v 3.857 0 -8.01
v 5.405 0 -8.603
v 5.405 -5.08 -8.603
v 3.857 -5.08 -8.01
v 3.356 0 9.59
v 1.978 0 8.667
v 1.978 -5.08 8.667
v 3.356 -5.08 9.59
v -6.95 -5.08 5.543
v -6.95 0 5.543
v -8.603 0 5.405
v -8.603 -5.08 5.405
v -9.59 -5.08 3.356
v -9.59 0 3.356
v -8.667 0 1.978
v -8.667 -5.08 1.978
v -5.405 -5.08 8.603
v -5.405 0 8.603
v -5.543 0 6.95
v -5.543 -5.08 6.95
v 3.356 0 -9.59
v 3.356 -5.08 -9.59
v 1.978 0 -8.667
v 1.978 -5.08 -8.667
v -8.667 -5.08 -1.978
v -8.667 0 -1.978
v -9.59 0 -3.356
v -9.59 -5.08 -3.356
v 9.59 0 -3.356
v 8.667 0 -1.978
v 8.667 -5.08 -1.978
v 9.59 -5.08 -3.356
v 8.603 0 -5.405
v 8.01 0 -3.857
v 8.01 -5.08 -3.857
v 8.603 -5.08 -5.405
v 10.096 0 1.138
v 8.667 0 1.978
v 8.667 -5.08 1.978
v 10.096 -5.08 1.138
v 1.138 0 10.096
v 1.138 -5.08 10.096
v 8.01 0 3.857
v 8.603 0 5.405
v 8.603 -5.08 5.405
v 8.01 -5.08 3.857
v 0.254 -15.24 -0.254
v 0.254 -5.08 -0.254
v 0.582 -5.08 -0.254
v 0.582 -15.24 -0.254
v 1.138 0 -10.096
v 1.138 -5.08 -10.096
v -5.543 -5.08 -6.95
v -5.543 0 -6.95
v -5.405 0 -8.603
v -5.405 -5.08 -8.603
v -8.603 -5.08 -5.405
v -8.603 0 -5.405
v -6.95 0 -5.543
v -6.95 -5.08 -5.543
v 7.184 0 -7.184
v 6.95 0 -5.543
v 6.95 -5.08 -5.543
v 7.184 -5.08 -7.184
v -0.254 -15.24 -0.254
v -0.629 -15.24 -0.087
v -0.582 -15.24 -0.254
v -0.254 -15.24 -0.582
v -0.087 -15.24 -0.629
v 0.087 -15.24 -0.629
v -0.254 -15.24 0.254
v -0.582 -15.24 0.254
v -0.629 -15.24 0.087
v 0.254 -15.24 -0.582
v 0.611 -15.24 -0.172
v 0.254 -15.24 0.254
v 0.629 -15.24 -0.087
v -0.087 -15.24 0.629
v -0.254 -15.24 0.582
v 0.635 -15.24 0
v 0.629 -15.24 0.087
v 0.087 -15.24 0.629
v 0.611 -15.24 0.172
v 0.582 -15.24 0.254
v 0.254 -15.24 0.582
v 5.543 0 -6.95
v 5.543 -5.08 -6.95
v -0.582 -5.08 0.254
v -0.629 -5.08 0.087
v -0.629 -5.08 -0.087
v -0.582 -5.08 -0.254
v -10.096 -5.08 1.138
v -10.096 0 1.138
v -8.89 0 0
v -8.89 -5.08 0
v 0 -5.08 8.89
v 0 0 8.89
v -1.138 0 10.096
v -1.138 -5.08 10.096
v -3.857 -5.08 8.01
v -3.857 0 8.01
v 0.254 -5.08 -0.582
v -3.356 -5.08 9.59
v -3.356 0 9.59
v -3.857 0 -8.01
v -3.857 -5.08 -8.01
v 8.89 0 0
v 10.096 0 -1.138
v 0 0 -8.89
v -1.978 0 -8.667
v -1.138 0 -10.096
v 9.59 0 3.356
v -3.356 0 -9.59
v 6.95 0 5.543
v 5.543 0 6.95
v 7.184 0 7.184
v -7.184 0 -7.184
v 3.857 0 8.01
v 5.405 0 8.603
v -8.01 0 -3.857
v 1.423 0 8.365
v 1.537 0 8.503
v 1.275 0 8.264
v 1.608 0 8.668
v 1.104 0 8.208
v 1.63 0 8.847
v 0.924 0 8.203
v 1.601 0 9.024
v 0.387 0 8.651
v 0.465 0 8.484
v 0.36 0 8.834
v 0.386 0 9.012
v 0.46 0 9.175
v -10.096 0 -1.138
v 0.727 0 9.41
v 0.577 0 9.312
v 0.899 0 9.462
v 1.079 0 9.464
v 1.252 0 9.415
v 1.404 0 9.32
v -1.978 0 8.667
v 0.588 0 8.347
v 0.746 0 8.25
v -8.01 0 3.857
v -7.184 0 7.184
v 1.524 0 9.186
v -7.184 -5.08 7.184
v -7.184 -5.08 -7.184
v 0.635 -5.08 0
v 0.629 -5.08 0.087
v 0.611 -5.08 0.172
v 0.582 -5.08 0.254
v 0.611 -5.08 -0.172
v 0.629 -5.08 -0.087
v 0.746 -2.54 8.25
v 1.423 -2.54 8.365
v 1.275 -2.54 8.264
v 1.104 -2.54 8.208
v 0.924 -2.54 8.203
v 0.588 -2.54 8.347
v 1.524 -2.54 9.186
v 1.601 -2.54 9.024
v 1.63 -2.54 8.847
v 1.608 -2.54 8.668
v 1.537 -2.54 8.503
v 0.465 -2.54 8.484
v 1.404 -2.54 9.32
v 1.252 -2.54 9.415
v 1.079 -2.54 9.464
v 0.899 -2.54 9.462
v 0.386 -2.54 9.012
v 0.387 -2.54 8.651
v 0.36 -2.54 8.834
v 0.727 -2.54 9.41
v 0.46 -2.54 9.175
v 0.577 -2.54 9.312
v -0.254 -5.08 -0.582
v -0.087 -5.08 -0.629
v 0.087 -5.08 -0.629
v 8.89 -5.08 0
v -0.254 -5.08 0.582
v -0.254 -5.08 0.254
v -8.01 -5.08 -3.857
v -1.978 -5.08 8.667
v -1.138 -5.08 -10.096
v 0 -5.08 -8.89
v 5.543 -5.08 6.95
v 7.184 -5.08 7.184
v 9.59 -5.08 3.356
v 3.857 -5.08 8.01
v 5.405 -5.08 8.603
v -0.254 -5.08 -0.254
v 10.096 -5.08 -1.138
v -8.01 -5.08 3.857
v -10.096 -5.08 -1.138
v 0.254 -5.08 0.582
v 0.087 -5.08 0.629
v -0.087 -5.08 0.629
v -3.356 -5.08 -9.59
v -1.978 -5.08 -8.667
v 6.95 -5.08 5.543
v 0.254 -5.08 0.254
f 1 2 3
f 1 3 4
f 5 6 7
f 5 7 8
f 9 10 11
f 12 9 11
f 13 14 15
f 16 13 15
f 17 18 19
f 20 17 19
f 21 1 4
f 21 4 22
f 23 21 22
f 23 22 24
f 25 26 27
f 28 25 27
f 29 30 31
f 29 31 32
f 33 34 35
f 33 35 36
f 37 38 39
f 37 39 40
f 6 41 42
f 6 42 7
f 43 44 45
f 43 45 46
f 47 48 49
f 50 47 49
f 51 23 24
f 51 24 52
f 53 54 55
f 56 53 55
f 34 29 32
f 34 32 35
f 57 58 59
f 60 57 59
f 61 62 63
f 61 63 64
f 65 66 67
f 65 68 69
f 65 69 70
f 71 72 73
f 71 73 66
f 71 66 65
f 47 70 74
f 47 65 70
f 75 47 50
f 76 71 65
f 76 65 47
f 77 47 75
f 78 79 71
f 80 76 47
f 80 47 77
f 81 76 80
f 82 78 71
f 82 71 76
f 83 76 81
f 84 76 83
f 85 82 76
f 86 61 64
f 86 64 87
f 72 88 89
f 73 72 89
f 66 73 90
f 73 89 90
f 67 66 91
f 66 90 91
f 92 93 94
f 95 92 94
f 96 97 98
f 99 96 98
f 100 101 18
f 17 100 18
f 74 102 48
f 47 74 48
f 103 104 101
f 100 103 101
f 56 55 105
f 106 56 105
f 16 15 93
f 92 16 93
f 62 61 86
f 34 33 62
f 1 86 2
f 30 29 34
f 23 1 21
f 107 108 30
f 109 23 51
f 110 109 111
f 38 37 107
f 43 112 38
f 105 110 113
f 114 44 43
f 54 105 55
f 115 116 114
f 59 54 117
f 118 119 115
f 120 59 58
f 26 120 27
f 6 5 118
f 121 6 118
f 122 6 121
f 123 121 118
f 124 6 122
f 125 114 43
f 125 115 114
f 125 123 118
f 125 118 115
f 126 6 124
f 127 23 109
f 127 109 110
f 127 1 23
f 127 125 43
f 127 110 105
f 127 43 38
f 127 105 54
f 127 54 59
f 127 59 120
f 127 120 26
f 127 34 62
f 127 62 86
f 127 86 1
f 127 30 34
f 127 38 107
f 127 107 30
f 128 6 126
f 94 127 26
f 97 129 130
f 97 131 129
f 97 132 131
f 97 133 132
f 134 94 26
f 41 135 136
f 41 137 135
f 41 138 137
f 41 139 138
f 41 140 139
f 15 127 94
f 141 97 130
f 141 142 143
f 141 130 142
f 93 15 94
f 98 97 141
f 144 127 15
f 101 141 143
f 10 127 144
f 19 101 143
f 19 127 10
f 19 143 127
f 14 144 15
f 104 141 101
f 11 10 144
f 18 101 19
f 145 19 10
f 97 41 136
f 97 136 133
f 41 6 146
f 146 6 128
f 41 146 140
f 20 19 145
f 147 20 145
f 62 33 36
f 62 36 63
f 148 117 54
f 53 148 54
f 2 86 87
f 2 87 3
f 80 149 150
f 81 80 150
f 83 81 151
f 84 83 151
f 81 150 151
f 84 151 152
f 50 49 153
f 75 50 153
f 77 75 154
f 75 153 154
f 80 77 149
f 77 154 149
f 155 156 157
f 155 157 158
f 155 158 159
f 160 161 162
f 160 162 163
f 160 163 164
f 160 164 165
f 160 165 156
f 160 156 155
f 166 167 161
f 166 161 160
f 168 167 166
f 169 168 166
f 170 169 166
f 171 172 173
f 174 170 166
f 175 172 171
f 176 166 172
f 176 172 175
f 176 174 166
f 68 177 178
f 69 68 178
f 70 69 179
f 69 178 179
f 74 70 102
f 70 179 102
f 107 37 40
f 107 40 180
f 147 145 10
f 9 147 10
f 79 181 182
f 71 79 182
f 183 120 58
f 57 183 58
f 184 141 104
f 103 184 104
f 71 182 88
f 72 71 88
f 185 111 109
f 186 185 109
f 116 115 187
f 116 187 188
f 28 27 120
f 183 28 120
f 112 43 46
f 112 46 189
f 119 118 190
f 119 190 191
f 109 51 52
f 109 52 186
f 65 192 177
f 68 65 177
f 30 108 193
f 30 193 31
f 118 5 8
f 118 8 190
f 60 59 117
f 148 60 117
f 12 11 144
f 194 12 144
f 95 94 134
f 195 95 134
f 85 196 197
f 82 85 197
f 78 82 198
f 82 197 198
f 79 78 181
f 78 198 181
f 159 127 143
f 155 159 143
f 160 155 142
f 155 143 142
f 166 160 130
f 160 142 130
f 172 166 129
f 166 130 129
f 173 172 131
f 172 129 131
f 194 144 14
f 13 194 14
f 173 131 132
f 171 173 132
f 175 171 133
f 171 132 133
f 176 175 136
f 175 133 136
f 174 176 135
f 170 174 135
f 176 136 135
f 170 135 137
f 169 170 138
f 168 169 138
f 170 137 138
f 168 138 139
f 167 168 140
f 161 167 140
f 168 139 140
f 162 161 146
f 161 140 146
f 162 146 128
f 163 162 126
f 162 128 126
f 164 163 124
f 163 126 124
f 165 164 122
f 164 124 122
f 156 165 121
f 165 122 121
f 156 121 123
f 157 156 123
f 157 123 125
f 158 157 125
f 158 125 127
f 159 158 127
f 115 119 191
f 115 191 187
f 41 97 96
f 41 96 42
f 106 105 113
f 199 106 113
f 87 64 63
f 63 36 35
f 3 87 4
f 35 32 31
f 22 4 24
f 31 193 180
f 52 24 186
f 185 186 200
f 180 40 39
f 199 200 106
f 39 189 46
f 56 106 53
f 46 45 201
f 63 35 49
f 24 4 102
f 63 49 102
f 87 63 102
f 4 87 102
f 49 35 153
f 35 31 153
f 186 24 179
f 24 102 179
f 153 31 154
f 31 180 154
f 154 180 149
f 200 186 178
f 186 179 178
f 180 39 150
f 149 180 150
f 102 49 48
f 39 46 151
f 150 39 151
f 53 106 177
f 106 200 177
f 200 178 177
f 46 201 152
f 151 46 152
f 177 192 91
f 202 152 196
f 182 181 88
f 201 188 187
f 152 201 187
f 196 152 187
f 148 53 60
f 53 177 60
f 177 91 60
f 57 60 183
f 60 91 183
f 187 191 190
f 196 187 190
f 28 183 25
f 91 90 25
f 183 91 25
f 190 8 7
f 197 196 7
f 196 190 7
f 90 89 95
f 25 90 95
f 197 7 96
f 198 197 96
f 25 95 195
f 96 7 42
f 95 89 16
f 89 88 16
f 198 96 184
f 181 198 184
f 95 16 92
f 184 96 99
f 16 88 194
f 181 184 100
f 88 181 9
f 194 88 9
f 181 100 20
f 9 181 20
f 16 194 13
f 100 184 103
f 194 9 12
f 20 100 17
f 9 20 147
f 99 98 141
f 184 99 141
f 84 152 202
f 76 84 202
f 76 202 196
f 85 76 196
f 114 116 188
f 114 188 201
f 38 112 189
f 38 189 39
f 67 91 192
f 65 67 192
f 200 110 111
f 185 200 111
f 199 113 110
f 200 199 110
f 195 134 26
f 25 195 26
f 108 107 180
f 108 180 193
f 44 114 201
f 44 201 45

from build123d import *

# Parameters (mm, degrees)
F1_DEPTH = 5.08
F3_W     = 0.508
F3_H     = 0.508
F4_DEPTH = 10.16
F6_DEPTH = 2.54


with BuildPart() as f1:
    # F0 (on Front) → F1 (new body)
    with BuildSketch(Plane.XZ):
        with BuildLine():
            Line((-4.7297651602, 7.5273781311), (0, 0))
            Line((0, 0), (-3.8572264408, 8.0096132357))
            ThreePointArc((-3.8572264408, 8.0096132357), (-4.3002609064, 7.7807362208), (-4.7297651602, 7.5273781311))
        make_face()
        with BuildLine():
            Line((-5.5428243385, 6.9504818791), (0, 0))
            Line((0, 0), (-4.7297651602, 7.5273781311))
            ThreePointArc((-4.7297651602, 7.5273781311), (-5.144387823, 7.250336125), (-5.5428243385, 6.9504818791))
        make_face()
        with BuildLine():
            Line((-5.4054458974, 8.6027178642), (-5.5428243385, 6.9504818791))
            ThreePointArc((-5.5428243385, 6.9504818791), (-5.144387823, 7.250336125), (-4.7297651602, 7.5273781311))
            Line((-4.7297651602, 7.5273781311), (-5.4054458974, 8.6027178642))
        make_face()
        with BuildLine():
            Line((-5.4054458974, 8.6027178642), (-4.7297651602, 7.5273781311))
            ThreePointArc((-4.7297651602, 7.5273781311), (-4.3002609064, 7.7807362208), (-3.8572264408, 8.0096132357))
            Line((-3.8572264408, 8.0096132357), (-5.4054458974, 8.6027178642))
        make_face()
        with BuildLine():
            Line((-3.3556352695, 9.5898546359), (-3.8572264408, 8.0096132357))
            ThreePointArc((-3.8572264408, 8.0096132357), (-3.4020557137, 8.213289044), (-2.9361808608, 8.3911228064))
            Line((-2.9361808608, 8.3911228064), (-3.3556352695, 9.5898546359))
        make_face()
        with BuildLine():
            Line((-3.3556352695, 9.5898546359), (-2.9361808608, 8.3911228064))
            ThreePointArc((-2.9361808608, 8.3911228064), (-2.4610676966, 8.5425549921), (-1.9782111029, 8.6671091393))
            Line((-1.9782111029, 8.6671091393), (-3.3556352695, 9.5898546359))
        make_face()
        with BuildLine():
            Line((-2.9361808608, 8.3911228064), (0, 0))
            Line((0, 0), (-1.9782111029, 8.6671091393))
            ThreePointArc((-1.9782111029, 8.6671091393), (-2.4610676966, 8.5425549921), (-2.9361808608, 8.3911228064))
        make_face()
        with BuildLine():
            Line((-3.8572264408, 8.0096132357), (0, 0))
            Line((0, 0), (-2.9361808608, 8.3911228064))
            ThreePointArc((-2.9361808608, 8.3911228064), (-3.4020557137, 8.213289044), (-3.8572264408, 8.0096132357))
        make_face()
        with BuildLine():
            Line((-0.9953641926, 8.834101546), (0, 0))
            Line((0, 0), (0, 8.89))
            ThreePointArc((0, 8.89), (-0.4984662759, 8.8760143855), (-0.9953641926, 8.834101546))
        make_face()
        with BuildLine():
            ThreePointArc((-0.9953641926, 8.834101546), (-0.4984662759, 8.8760143855), (0, 8.89))
            Line((0, 8.89), (-1.1375590772, 10.0961160525))
            Line((-1.1375590772, 10.0961160525), (-0.9953641926, 8.834101546))
        make_face()
        with BuildLine():
            Line((-1.1375590772, 10.0961160525), (-1.9782111029, 8.6671091393))
            ThreePointArc((-1.9782111029, 8.6671091393), (-1.4891303252, 8.7643933546), (-0.9953641926, 8.834101546))
            Line((-0.9953641926, 8.834101546), (-1.1375590772, 10.0961160525))
        make_face()
        with BuildLine():
            Line((-1.9782111029, 8.6671091393), (0, 0))
            Line((0, 0), (-0.9953641926, 8.834101546))
            ThreePointArc((-0.9953641926, 8.834101546), (-1.4891303252, 8.7643933546), (-1.9782111029, 8.6671091393))
        make_face()
        with BuildLine():
            Line((-6.2861792847, 6.2861792847), (0, 0))
            Line((0, 0), (-5.5428243385, 6.9504818791))
            ThreePointArc((-5.5428243385, 6.9504818791), (-5.923821078, 6.6287588458), (-6.2861792847, 6.2861792847))
        make_face()
        with BuildLine():
            Line((-7.1842048969, 7.1842048969), (-6.2861792847, 6.2861792847))
            ThreePointArc((-6.2861792847, 6.2861792847), (-5.923821078, 6.6287588458), (-5.5428243385, 6.9504818791))
            Line((-5.5428243385, 6.9504818791), (-7.1842048969, 7.1842048969))
        make_face()
        with BuildLine():
            Line((-6.9504818791, 5.5428243385), (0, 0))
            Line((0, 0), (-6.2861792847, 6.2861792847))
            ThreePointArc((-6.2861792847, 6.2861792847), (-6.6287588458, 5.923821078), (-6.9504818791, 5.5428243385))
        make_face()
        with BuildLine():
            Line((-7.1842048969, 7.1842048969), (-6.9504818791, 5.5428243385))
            ThreePointArc((-6.9504818791, 5.5428243385), (-6.6287588458, 5.923821078), (-6.2861792847, 6.2861792847))
            Line((-6.2861792847, 6.2861792847), (-7.1842048969, 7.1842048969))
        make_face()
        with BuildLine():
            Line((-7.5273781311, 4.7297651602), (0, 0))
            Line((0, 0), (-6.9504818791, 5.5428243385))
            ThreePointArc((-6.9504818791, 5.5428243385), (-7.250336125, 5.144387823), (-7.5273781311, 4.7297651602))
        make_face()
        with BuildLine():
            Line((-8.6027178642, 5.4054458974), (-7.5273781311, 4.7297651602))
            ThreePointArc((-7.5273781311, 4.7297651602), (-7.250336125, 5.144387823), (-6.9504818791, 5.5428243385))
            Line((-6.9504818791, 5.5428243385), (-8.6027178642, 5.4054458974))
        make_face()
        with BuildLine():
            Line((-8.6027178642, 5.4054458974), (-8.0096132357, 3.8572264408))
            ThreePointArc((-8.0096132357, 3.8572264408), (-7.7807362208, 4.3002609064), (-7.5273781311, 4.7297651602))
            Line((-7.5273781311, 4.7297651602), (-8.6027178642, 5.4054458974))
        make_face()
        with BuildLine():
            Line((-8.0096132357, 3.8572264408), (0, 0))
            Line((0, 0), (-7.5273781311, 4.7297651602))
            ThreePointArc((-7.5273781311, 4.7297651602), (-7.7807362208, 4.3002609064), (-8.0096132357, 3.8572264408))
        make_face()
        with BuildLine():
            Line((-8.3911228064, 2.9361808608), (0, 0))
            Line((0, 0), (-8.0096132357, 3.8572264408))
            ThreePointArc((-8.0096132357, 3.8572264408), (-8.213289044, 3.4020557137), (-8.3911228064, 2.9361808608))
        make_face()
        with BuildLine():
            Line((-9.5898546359, 3.3556352695), (-8.3911228064, 2.9361808608))
            ThreePointArc((-8.3911228064, 2.9361808608), (-8.213289044, 3.4020557137), (-8.0096132357, 3.8572264408))
            Line((-8.0096132357, 3.8572264408), (-9.5898546359, 3.3556352695))
        make_face()
        with BuildLine():
            Line((-9.5898546359, 3.3556352695), (-8.6671091393, 1.9782111029))
            ThreePointArc((-8.6671091393, 1.9782111029), (-8.5425549921, 2.4610676966), (-8.3911228064, 2.9361808608))
            Line((-8.3911228064, 2.9361808608), (-9.5898546359, 3.3556352695))
        make_face()
        with BuildLine():
            Line((-8.6671091393, 1.9782111029), (0, 0))
            Line((0, 0), (-8.3911228064, 2.9361808608))
            ThreePointArc((-8.3911228064, 2.9361808608), (-8.5425549921, 2.4610676966), (-8.6671091393, 1.9782111029))
        make_face()
        with BuildLine():
            Line((-8.834101546, 0.9953641926), (0, 0))
            Line((0, 0), (-8.6671091393, 1.9782111029))
            ThreePointArc((-8.6671091393, 1.9782111029), (-8.7643933546, 1.4891303252), (-8.834101546, 0.9953641926))
        make_face()
        with BuildLine():
            Line((-10.0961160525, 1.1375590772), (-8.834101546, 0.9953641926))
            ThreePointArc((-8.834101546, 0.9953641926), (-8.7643933546, 1.4891303252), (-8.6671091393, 1.9782111029))
            Line((-8.6671091393, 1.9782111029), (-10.0961160525, 1.1375590772))
        make_face()
        with BuildLine():
            Line((-10.0961160525, 1.1375590772), (-8.89, 0))
            ThreePointArc((-8.89, 0), (-8.8760143855, 0.4984662759), (-8.834101546, 0.9953641926))
            Line((-8.834101546, 0.9953641926), (-10.0961160525, 1.1375590772))
        make_face()
        with BuildLine():
            Line((-8.89, 0), (0, 0))
            Line((0, 0), (-8.834101546, 0.9953641926))
            ThreePointArc((-8.834101546, 0.9953641926), (-8.8760143855, 0.4984662759), (-8.89, 0))
        make_face()
        with BuildLine():
            Line((-8.834101546, -0.9953641926), (0, 0))
            Line((0, 0), (-8.89, 0))
            ThreePointArc((-8.89, 0), (-8.8760143855, -0.4984662759), (-8.834101546, -0.9953641926))
        make_face()
        with BuildLine():
            Line((-10.0961160525, -1.1375590772), (-8.834101546, -0.9953641926))
            ThreePointArc((-8.834101546, -0.9953641926), (-8.8760143855, -0.4984662759), (-8.89, 0))
            Line((-8.89, 0), (-10.0961160525, -1.1375590772))
        make_face()
        with BuildLine():
            Line((-10.0961160525, -1.1375590772), (-8.6671091393, -1.9782111029))
            ThreePointArc((-8.6671091393, -1.9782111029), (-8.7643933546, -1.4891303252), (-8.834101546, -0.9953641926))
            Line((-8.834101546, -0.9953641926), (-10.0961160525, -1.1375590772))
        make_face()
        with BuildLine():
            Line((-8.6671091393, -1.9782111029), (0, 0))
            Line((0, 0), (-8.834101546, -0.9953641926))
            ThreePointArc((-8.834101546, -0.9953641926), (-8.7643933546, -1.4891303252), (-8.6671091393, -1.9782111029))
        make_face()
        with BuildLine():
            Line((-8.3911228064, -2.9361808608), (0, 0))
            Line((0, 0), (-8.6671091393, -1.9782111029))
            ThreePointArc((-8.6671091393, -1.9782111029), (-8.5425549921, -2.4610676966), (-8.3911228064, -2.9361808608))
        make_face()
        with BuildLine():
            Line((-9.5898546359, -3.3556352695), (-8.3911228064, -2.9361808608))
            ThreePointArc((-8.3911228064, -2.9361808608), (-8.5425549921, -2.4610676966), (-8.6671091393, -1.9782111029))
            Line((-8.6671091393, -1.9782111029), (-9.5898546359, -3.3556352695))
        make_face()
        with BuildLine():
            Line((-9.5898546359, -3.3556352695), (-8.0096132357, -3.8572264408))
            ThreePointArc((-8.0096132357, -3.8572264408), (-8.213289044, -3.4020557137), (-8.3911228064, -2.9361808608))
            Line((-8.3911228064, -2.9361808608), (-9.5898546359, -3.3556352695))
        make_face()
        with BuildLine():
            Line((-8.0096132357, -3.8572264408), (0, 0))
            Line((0, 0), (-8.3911228064, -2.9361808608))
            ThreePointArc((-8.3911228064, -2.9361808608), (-8.213289044, -3.4020557137), (-8.0096132357, -3.8572264408))
        make_face()
        with BuildLine():
            Line((-7.5273781311, -4.7297651602), (0, 0))
            Line((0, 0), (-8.0096132357, -3.8572264408))
            ThreePointArc((-8.0096132357, -3.8572264408), (-7.7807362208, -4.3002609064), (-7.5273781311, -4.7297651602))
        make_face()
        with BuildLine():
            Line((-8.6027178642, -5.4054458974), (-7.5273781311, -4.7297651602))
            ThreePointArc((-7.5273781311, -4.7297651602), (-7.7807362208, -4.3002609064), (-8.0096132357, -3.8572264408))
            Line((-8.0096132357, -3.8572264408), (-8.6027178642, -5.4054458974))
        make_face()
        with BuildLine():
            Line((-8.6027178642, -5.4054458974), (-6.9504818791, -5.5428243385))
            ThreePointArc((-6.9504818791, -5.5428243385), (-7.250336125, -5.144387823), (-7.5273781311, -4.7297651602))
            Line((-7.5273781311, -4.7297651602), (-8.6027178642, -5.4054458974))
        make_face()
        with BuildLine():
            Line((-6.9504818791, -5.5428243385), (0, 0))
            Line((0, 0), (-7.5273781311, -4.7297651602))
            ThreePointArc((-7.5273781311, -4.7297651602), (-7.250336125, -5.144387823), (-6.9504818791, -5.5428243385))
        make_face()
        with BuildLine():
            Line((-6.2861792847, -6.2861792847), (0, 0))
            Line((0, 0), (-6.9504818791, -5.5428243385))
            ThreePointArc((-6.9504818791, -5.5428243385), (-6.6287588458, -5.923821078), (-6.2861792847, -6.2861792847))
        make_face()
        with BuildLine():
            Line((-5.5428243385, -6.9504818791), (0, 0))
            Line((0, 0), (-6.2861792847, -6.2861792847))
            ThreePointArc((-6.2861792847, -6.2861792847), (-5.923821078, -6.6287588458), (-5.5428243385, -6.9504818791))
        make_face()
        with BuildLine():
            Line((-4.7297651602, -7.5273781311), (0, 0))
            Line((0, 0), (-5.5428243385, -6.9504818791))
            ThreePointArc((-5.5428243385, -6.9504818791), (-5.144387823, -7.250336125), (-4.7297651602, -7.5273781311))
        make_face()
        with BuildLine():
            Line((-7.1842048969, -7.1842048969), (-6.2861792847, -6.2861792847))
            ThreePointArc((-6.2861792847, -6.2861792847), (-6.6287588458, -5.923821078), (-6.9504818791, -5.5428243385))
            Line((-6.9504818791, -5.5428243385), (-7.1842048969, -7.1842048969))
        make_face()
        with BuildLine():
            Line((-7.1842048969, -7.1842048969), (-5.5428243385, -6.9504818791))
            ThreePointArc((-5.5428243385, -6.9504818791), (-5.923821078, -6.6287588458), (-6.2861792847, -6.2861792847))
            Line((-6.2861792847, -6.2861792847), (-7.1842048969, -7.1842048969))
        make_face()
        with BuildLine():
            Line((-5.4054458974, -8.6027178642), (-4.7297651602, -7.5273781311))
            ThreePointArc((-4.7297651602, -7.5273781311), (-5.144387823, -7.250336125), (-5.5428243385, -6.9504818791))
            Line((-5.5428243385, -6.9504818791), (-5.4054458974, -8.6027178642))
        make_face()
        with BuildLine():
            Line((-5.4054458974, -8.6027178642), (-3.8572264408, -8.0096132357))
            ThreePointArc((-3.8572264408, -8.0096132357), (-4.3002609064, -7.7807362208), (-4.7297651602, -7.5273781311))
            Line((-4.7297651602, -7.5273781311), (-5.4054458974, -8.6027178642))
        make_face()
        with BuildLine():
            Line((-2.9361808608, -8.3911228064), (0, 0))
            Line((0, 0), (-3.8572264408, -8.0096132357))
            ThreePointArc((-3.8572264408, -8.0096132357), (-3.4020557137, -8.213289044), (-2.9361808608, -8.3911228064))
        make_face()
        with BuildLine():
            Line((-3.3556352695, -9.5898546359), (-2.9361808608, -8.3911228064))
            ThreePointArc((-2.9361808608, -8.3911228064), (-3.4020557137, -8.213289044), (-3.8572264408, -8.0096132357))
            Line((-3.8572264408, -8.0096132357), (-3.3556352695, -9.5898546359))
        make_face()
        with BuildLine():
            Line((-3.3556352695, -9.5898546359), (-1.9782111029, -8.6671091393))
            ThreePointArc((-1.9782111029, -8.6671091393), (-2.4610676966, -8.5425549921), (-2.9361808608, -8.3911228064))
            Line((-2.9361808608, -8.3911228064), (-3.3556352695, -9.5898546359))
        make_face()
        with BuildLine():
            Line((-1.9782111029, -8.6671091393), (0, 0))
            Line((0, 0), (-2.9361808608, -8.3911228064))
            ThreePointArc((-2.9361808608, -8.3911228064), (-2.4610676966, -8.5425549921), (-1.9782111029, -8.6671091393))
        make_face()
        with BuildLine():
            Line((-0.9953641926, -8.834101546), (0, 0))
            Line((0, 0), (-1.9782111029, -8.6671091393))
            ThreePointArc((-1.9782111029, -8.6671091393), (-1.4891303252, -8.7643933546), (-0.9953641926, -8.834101546))
        make_face()
        with BuildLine():
            Line((-1.1375590772, -10.0961160525), (0, -8.89))
            ThreePointArc((0, -8.89), (-0.4984662759, -8.8760143855), (-0.9953641926, -8.834101546))
            Line((-0.9953641926, -8.834101546), (-1.1375590772, -10.0961160525))
        make_face()
        with BuildLine():
            ThreePointArc((-0.9953641926, -8.834101546), (-1.4891303252, -8.7643933546), (-1.9782111029, -8.6671091393))
            Line((-1.9782111029, -8.6671091393), (-1.1375590772, -10.0961160525))
            Line((-1.1375590772, -10.0961160525), (-0.9953641926, -8.834101546))
        make_face()
        with BuildLine():
            Line((0, -8.89), (0, 0))
            Line((0, 0), (-0.9953641926, -8.834101546))
            ThreePointArc((-0.9953641926, -8.834101546), (-0.4984662759, -8.8760143855), (0, -8.89))
        make_face()
        with BuildLine():
            Line((-3.8572264408, -8.0096132357), (0, 0))
            Line((0, 0), (-4.7297651602, -7.5273781311))
            ThreePointArc((-4.7297651602, -7.5273781311), (-4.3002609064, -7.7807362208), (-3.8572264408, -8.0096132357))
        make_face()
    extrude(amount=F1_DEPTH)

    # F2: F1 across plane


with BuildPart() as f1_1:
    add(f1.part)
    add(f1.part.mirror(Plane.YZ))

    # F3 (on face) → F4 (join)
    with BuildSketch(Plane.XZ.offset(5.08)):
        with BuildLine():
            Line((0.254, 0.254), (0.254, 0.5819871133))
            ThreePointArc((0.254, 0.5819871133), (0, 0.635), (-0.254, 0.5819871133))
            Line((-0.254, 0.5819871133), (-0.254, 0.254))
            Line((-0.254, 0.254), (0.254, 0.254))
        make_face()
        with BuildLine():
            Line((-0.254, -0.254), (-0.254, 0.254))
            Line((-0.254, 0.254), (-0.5819871133, 0.254))
            ThreePointArc((-0.5819871133, 0.254), (-0.635, 0), (-0.5819871133, -0.254))
            Line((-0.5819871133, -0.254), (-0.254, -0.254))
        make_face()
        Rectangle(F3_W, F3_H)
        with BuildLine():
            ThreePointArc((0.5819871133, -0.254), (0.6216055087, -0.1297366237), (0.635, 0))
            ThreePointArc((0.635, 0), (0.6216055087, 0.1297366237), (0.5819871133, 0.254))
            Line((0.5819871133, 0.254), (0.254, 0.254))
            Line((0.254, 0.254), (0.254, -0.254))
            Line((0.254, -0.254), (0.5819871133, -0.254))
        make_face()
        with BuildLine():
            ThreePointArc((-0.254, -0.5819871133), (0, -0.635), (0.254, -0.5819871133))
            Line((0.254, -0.5819871133), (0.254, -0.254))
            Line((0.254, -0.254), (-0.254, -0.254))
            Line((-0.254, -0.254), (-0.254, -0.5819871133))
        make_face()
    extrude(amount=F4_DEPTH)

    # F5 (on face) → F6 (cut)
    with BuildSketch(Plane(origin=(0, 0, 0), x_dir=(-1, 0, 0), z_dir=(0, 1, 0))):
        with BuildLine():
            ThreePointArc((-0.9242667502, 8.2030942927), (-0.5218814179, 8.410971469), (-0.3603641926, 8.834101546))
            ThreePointArc((-0.3603641926, 8.834101546), (-1.4688469673, 9.257231623), (-0.9242667502, 8.2030942927))
        make_face()
    extrude(amount=-F6_DEPTH, mode=Mode.SUBTRACT)


solid = f1_1.part
